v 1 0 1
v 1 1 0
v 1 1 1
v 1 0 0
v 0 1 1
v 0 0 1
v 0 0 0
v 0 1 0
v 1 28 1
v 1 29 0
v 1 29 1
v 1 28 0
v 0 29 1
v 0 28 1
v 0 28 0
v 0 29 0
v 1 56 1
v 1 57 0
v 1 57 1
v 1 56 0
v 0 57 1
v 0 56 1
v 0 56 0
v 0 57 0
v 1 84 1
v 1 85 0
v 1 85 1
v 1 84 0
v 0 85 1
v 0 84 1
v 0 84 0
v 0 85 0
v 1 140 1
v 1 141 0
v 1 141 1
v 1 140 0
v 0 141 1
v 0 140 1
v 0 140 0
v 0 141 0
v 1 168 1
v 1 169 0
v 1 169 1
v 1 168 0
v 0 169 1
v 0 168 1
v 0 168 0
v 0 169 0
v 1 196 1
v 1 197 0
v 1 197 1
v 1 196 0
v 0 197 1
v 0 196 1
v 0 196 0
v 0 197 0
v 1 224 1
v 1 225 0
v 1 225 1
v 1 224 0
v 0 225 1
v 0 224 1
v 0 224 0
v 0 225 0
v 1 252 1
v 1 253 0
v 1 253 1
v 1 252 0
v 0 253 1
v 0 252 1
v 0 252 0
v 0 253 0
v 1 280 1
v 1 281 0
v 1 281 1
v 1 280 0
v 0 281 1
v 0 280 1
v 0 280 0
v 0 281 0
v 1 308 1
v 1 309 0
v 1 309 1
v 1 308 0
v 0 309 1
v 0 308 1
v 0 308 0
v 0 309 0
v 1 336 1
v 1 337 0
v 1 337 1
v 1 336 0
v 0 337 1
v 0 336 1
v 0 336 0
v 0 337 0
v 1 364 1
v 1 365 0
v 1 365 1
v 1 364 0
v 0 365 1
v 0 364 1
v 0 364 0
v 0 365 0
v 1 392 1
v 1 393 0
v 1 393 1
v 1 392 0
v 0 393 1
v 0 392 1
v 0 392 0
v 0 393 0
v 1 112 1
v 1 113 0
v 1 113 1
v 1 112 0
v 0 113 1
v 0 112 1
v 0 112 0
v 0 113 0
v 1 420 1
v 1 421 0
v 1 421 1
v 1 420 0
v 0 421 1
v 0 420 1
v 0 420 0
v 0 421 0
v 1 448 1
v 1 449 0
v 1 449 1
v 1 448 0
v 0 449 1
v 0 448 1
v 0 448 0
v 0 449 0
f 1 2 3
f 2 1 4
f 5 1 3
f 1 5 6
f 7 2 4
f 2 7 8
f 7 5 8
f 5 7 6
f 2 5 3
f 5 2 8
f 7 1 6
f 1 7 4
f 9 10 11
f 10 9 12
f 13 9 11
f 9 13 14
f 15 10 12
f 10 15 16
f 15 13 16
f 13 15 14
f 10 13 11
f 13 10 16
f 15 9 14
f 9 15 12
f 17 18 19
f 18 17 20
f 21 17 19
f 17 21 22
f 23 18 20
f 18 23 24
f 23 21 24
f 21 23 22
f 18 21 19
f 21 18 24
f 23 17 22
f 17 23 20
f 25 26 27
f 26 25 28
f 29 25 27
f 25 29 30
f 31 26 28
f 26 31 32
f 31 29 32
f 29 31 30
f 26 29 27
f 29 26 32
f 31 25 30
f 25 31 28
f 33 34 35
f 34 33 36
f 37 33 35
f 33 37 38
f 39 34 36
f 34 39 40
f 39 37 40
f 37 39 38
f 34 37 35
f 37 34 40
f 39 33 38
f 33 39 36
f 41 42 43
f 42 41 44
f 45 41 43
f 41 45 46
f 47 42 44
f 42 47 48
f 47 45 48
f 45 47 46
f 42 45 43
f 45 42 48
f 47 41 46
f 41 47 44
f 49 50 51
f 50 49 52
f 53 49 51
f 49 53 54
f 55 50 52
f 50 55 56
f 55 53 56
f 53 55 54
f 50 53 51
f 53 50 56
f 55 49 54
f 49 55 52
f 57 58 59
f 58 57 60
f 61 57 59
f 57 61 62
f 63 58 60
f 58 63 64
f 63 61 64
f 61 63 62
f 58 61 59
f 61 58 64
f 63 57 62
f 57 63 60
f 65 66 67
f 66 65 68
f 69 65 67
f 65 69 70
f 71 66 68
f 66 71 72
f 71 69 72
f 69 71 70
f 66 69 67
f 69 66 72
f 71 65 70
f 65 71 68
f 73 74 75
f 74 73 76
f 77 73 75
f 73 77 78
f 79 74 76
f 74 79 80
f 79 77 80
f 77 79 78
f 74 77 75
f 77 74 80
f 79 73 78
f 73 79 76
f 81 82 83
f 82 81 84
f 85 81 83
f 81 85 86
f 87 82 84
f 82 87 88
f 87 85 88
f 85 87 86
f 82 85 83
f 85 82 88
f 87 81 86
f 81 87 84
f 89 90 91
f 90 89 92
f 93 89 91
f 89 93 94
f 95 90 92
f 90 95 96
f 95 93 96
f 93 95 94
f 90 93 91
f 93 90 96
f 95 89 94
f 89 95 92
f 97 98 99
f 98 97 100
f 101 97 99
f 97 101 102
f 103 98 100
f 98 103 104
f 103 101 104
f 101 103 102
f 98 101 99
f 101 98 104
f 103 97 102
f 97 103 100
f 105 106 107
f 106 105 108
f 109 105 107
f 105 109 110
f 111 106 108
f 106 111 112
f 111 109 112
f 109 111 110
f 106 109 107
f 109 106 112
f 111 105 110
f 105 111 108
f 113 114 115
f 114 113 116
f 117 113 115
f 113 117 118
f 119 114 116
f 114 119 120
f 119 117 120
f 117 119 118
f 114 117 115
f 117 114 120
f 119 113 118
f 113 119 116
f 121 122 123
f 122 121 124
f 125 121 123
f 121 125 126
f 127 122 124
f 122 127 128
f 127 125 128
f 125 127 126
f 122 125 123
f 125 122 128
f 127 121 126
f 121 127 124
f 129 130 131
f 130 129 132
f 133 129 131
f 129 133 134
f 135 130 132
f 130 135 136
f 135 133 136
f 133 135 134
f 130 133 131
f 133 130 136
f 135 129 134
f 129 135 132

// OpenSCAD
// file: ../lib_counter_trays.scad
/*
     Required parameters:
        toksize        width/height of token, in mm.  Counters must be square.
        tokthick       thickness of token, in mm.
        sections       list of how many counters should be in each section.
                       For example to have 3 sections with enough room for 
                       10, 7, and 4 counters of the size and thickness 
                       provided by the first 2 parameters, enter [10, 7, 4]

     Optional parameters: 
     Specify name=value separated by commas.  They can be listed in any order, 
     and are all optional, with default values.
         wallthick     Thickness of outer walls of the box.  Defaults to 1mm.
         intwallthick  Thickness of partitions between counters. If
                       not specified or set to zero, defaults to the same 
                       value as outer walls (1mm unless changed above).
         slack         Slop. Fiddle factor. Extra padding added to a few
                       places to account for some things not being physically
                       perfect. Defaults to 0.8mm.
         gap           How much room to leave between the boxes and the 
                       covers objects on the print plate.
         tolerance     How much extra space to leave between the box and
                       the cover to allow them to friction fit.  This is
                       probably what needs to most tuning between different
                       printers/etc.  Defaults to 0.1mm.  Adjust down if the
                       fit is too loose and the box keeps falling out. Adjust
                       up if the fit is too tight and the box doesn't fit.
         tokheight     If specified, makes a rectangular token, with this height.
                       Otherwise you get a toksize x toksize square.

     ArrangeCounterBox is a convenience module to arrange multiple boxes on
     the same print plate.  Usage is optional. It takes the token size as
     the only required argument. wallthick can also be provided as above.

 */

module HexBox(toksize, tokthick, sections, wallthick=1, slack=0.6, tolerance=0.1) {
    function sum1(list, i) = i >= 0 ? list[i] + sum1(list, i-1) : 0;
    function sum(list) = sum1(list, len(list)-1);

    ntok = sum(sections);
    nsec = len(sections);

    length = wallthick*2 + ntok*tokthick + nsec * slack + (nsec-2)*wallthick;
    offs = [ for (s = sections) s*tokthick + slack + wallthick ];

    r = (toksize/2)/tan(60);
    s = (toksize/2)/sin(60);

    // flat-top 
    // polygon([[0, 0], [r, -toksize/2], [r+s, -toksize/2], [2*r+s, 0], [r+s, toksize/2], [r, toksize/2]]);

    difference() {
        cube([2*wallthick + length, 2*wallthick + slack + toksize, r*2]);
        translate([wallthick, wallthick, r*2+wallthick]) {
            rotate([90, 0, 90]) {
                linear_extrude(length) {
                    polygon([[0, 0],
                            [0, -s/2],
                            [toksize/2+slack, -s/2-r],
                            [toksize+slack, -s/2],
                            [toksize+slack, 0]
                        ]);
                }
            }
        }
    }
    // sections
    translate([wallthick, wallthick, wallthick]) {
        for (i=[0:1:len(sections)-2]) {
            off=sum1(offs, i) - wallthick;

            translate([off, 0, 0]) {
                cube([wallthick, wallthick + toksize, r*2-wallthick]);
            }
        }
    }

    extraheadroom = 1;
    gap = 2;
    height = 4*r ;
    width = 2*wallthick + toksize + gap;

    // case
    caselen=length+2*wallthick;
    translate([- (height + 2*wallthick + tolerance + extraheadroom) - gap, 0, caselen]) {
        rotate([0, 90, 0]) {
            difference() {
                cube([caselen, width+wallthick*2, height+wallthick*2+extraheadroom]);
                translate([-1, wallthick-tolerance/2, wallthick-tolerance/2]) {
                    cube([caselen, width+tolerance, height+tolerance+extraheadroom]);
                }
                translate([caselen, (width+wallthick*2+tolerance)/2 , (height+wallthick*2+tolerance)/2]) {
                    cube([wallthick*2+1, width*(2/3), height*(2/3)], center=true);
                }
            }
        }
    }
}

module CounterBox(toksize, tokthick, sections, wallthick=1, intwallthick=0, slack=0.8, gap=10,  tolerance=0.1, tokheight=0, extraheadroom=1, skipcase=0, cards=0) {
    function sum1(list, i) = i >= 0 ? list[i] + sum1(list, i-1) : 0;
    function sum(list) = sum1(list, len(list)-1);
    theight = tokheight == 0 ? toksize : tokheight;
    docards = cards == 0 ? false : true;

    intwall = intwallthick ? intwallthick :  wallthick;

    offs = [ for (s = sections) s*tokthick + slack + intwall ];
    ntok = sum(sections);
    nsec = len(sections);

    length = wallthick*2 + ntok*tokthick + nsec * slack + (nsec-1)*intwall;
    width = wallthick*2 + toksize + slack;
    height = wallthick + theight + slack;
    partheight = wallthick + height * (2/3);


    // box
    difference() {
        holew=width*.6;
        cube([length, width, partheight]);
        translate([wallthick, wallthick, wallthick]) {
            cube([length-2*wallthick, width-2*wallthick, height]);
        }
        translate([wallthick, wallthick, wallthick]) {
            for (i=[0:1:len(sections)-2]) {
                off=sum1(offs, i) - wallthick;
                holel = offs[i+1] * .5;
                translate([off, 0, 0]) {
                    if (offs[i+1] > (height / 2)) {
                        translate([(offs[i+1])/2 - holel/2 + wallthick/2,width/2 - holew/2 - wallthick,-wallthick*2]) {
                            cube([holel, holew,wallthick*2+1]);
                        }
                    }
                }
            }
        }
    }

    // sections
    translate([wallthick, wallthick, wallthick]) {
        for (i=[0:1:len(sections)-2]) {
            off=sum1(offs, i) - wallthick;

            translate([off, 0, 0]) {
                difference() {
                    cube([intwall, width - 2 * wallthick, partheight - wallthick]);
                    if (cards) {
                        translate([-1, width / 2, partheight]) {
                            rotate([0, 90, 0]) {
                                linear_extrude(wallthick + 2) {
                                    circle(width / 3);
                                }
                            }
                        }
                    }
                }
            }
        }
    }
    if (skipcase == 0) {
        // case
        caselen=length+wallthick;
        translate([- (height + 2*wallthick + tolerance + extraheadroom) - gap, 0, caselen]) {
            rotate([0, 90, 0]) {
                difference() {
                    cube([caselen, width+wallthick*2, height+wallthick*2+extraheadroom]);
                    translate([-1, wallthick-tolerance/2, wallthick-tolerance/2]) {
                        cube([caselen, width+tolerance, height+tolerance+extraheadroom]);
                    }
                    translate([caselen, (width+wallthick*2+tolerance)/2 , (height+wallthick*2+tolerance)/2]) {
                        cube([wallthick*2+1, width*(2/3), height*(2/3)], center=true);
                    }
                }
            }
        }
    }
}

module ArrangeCounterBox(toksize, wallthick=1) {
    for (i=[0:$children-1]) {
        translate([0, i*(toksize+wallthick*4+5), 0]) {
            children(i);
        }
    }
}
// main file
include <../lib_counter_trays.scad>

ArrangeCounterBox(19) {
    // Utility
    CounterBox(16, 2.2, [
        19,   // skills
        10,   // Melee / Upper Level
        5,    // Melee / Stealth
        28,   // fired / moved
        10,   // assault move / low crawl
        3,    // wounded
    ], "Control 1");

    CounterBox(16, 2.2, [
        15,   // ops complete / spotted
        5,    // hit and run / mines
        5,    // hit and run / immobilized
        5,    // hit and run / abandoned
        12,   // fire for effect  / spotting round
        5,    // shaken / continuous move
        5,    // shaken / low crawl
        10,   // shaken / abandoned
        2,    // event
        4,    // objective
        2,    // turn, SoP
        4,    // rp heros
    ], "Control 2");

    // Ground/conditions
    CounterBox(16, 2.2, [
        5,    // Foxholes
        11,   // Wreck
        6,    // Roadblock
        5,    // Emplaced
    ], "Ground");

    // ordnance
    CounterBox(16, 2.2, [
        5,    // acquiring
        5,    // target
        7,    // acquiring
        7,    // target
        5,    // fire
        9,    // FIRE
        12,   // Smoke
        8,    // Starshell
    ], "Ordnance");

    // huh
    CounterBox(16, 2.2, [
        20,
        20
    ], "Huh");

    // Russian
    CounterBox(16, 2.2, [
        17,   // turrets
        4,    // PTRS
        4,    // DP 28
        10,   // leaders
        1,    // sniper
        4,    // hero
        4,    // crew
    ], "Leaders/Weapons");
    // control
    CounterBox(16, 2.2, [
        20,   // 0-3-4-6
        12,   // 0-4-4-6
        14,   // 1-3-4-4
        18,   // 1-4-4-5
    ], "Squads");
    // guard
    CounterBox(16, 2.2, [
        10,   // 1-3-4-5
        20,   // 2-2-4-6
        2,    // leaders
        2,    // heros
    ], "Guard");
    CounterBox(19, 2.2, [
        4,    // Tachanka
        3,    // 12.7mm
        5,    // 45mm ATG
        2,    // 76mm ATG
    ], "Guns");

    CounterBox(23, 2.2, [
        4,    // KV 1C
        9,    // T34
        3,    // T70 
        1,    // IL-2
    ], "Tanks");

    // German
    CounterBox(16, 2.2, [
        6,    // leaders
        3,    // heroes
        28,   // turrets
        4,    // flamethrower
        4,    // mg34
        1,    // sniper
        4,    // crew
        2,    // crew
    ], "Leaders/Weapons");

    CounterBox(16, 2.2, [
        10,   // 0-5-4-5
        10,   // 1-3-4-5
        10,   // 1-3-4-6
        15,   // 1-4-4-5
    ], "Squads 1");

    CounterBox(16, 2.2, [
        10,   // 1-5-4-5
        20,   // 1-6-4-5
        16,   // 2-3-4-6
        10,  // 1-3-20-5
        15,  // 1-4-20-5
    ], "Squads 2");

    CounterBox(19, 2.2, [
        3,   // LelG-18
        3,   // Pak-40
        3,   // 50 mm
        2,   // 88 mm ATG
        3,   // 7.92 MG
        4,   // 50 mm ATG
    ], "Guns");

    CounterBox(23, 2.2, [
        6,   // Pz IV F
        6,   // Pz IV G
        3,   // Pz II F
        8,   // Pz III J
        2,   // Pz III J (SS)
        1,   // Sig 33 B
        2,   // Marder II
        3,   // Stug 3F
        8,   // SdKfz 231
    ], "Tanks");

    CounterBox(23, 2.2, [
        7,   // Emplacement
        7,   // Hull down
    ], "Emp/Hull");

    CounterBox(19, 2.2, [
        4,   // Victory
        4,   // Objective
    ], "Vic/Obj");
}
